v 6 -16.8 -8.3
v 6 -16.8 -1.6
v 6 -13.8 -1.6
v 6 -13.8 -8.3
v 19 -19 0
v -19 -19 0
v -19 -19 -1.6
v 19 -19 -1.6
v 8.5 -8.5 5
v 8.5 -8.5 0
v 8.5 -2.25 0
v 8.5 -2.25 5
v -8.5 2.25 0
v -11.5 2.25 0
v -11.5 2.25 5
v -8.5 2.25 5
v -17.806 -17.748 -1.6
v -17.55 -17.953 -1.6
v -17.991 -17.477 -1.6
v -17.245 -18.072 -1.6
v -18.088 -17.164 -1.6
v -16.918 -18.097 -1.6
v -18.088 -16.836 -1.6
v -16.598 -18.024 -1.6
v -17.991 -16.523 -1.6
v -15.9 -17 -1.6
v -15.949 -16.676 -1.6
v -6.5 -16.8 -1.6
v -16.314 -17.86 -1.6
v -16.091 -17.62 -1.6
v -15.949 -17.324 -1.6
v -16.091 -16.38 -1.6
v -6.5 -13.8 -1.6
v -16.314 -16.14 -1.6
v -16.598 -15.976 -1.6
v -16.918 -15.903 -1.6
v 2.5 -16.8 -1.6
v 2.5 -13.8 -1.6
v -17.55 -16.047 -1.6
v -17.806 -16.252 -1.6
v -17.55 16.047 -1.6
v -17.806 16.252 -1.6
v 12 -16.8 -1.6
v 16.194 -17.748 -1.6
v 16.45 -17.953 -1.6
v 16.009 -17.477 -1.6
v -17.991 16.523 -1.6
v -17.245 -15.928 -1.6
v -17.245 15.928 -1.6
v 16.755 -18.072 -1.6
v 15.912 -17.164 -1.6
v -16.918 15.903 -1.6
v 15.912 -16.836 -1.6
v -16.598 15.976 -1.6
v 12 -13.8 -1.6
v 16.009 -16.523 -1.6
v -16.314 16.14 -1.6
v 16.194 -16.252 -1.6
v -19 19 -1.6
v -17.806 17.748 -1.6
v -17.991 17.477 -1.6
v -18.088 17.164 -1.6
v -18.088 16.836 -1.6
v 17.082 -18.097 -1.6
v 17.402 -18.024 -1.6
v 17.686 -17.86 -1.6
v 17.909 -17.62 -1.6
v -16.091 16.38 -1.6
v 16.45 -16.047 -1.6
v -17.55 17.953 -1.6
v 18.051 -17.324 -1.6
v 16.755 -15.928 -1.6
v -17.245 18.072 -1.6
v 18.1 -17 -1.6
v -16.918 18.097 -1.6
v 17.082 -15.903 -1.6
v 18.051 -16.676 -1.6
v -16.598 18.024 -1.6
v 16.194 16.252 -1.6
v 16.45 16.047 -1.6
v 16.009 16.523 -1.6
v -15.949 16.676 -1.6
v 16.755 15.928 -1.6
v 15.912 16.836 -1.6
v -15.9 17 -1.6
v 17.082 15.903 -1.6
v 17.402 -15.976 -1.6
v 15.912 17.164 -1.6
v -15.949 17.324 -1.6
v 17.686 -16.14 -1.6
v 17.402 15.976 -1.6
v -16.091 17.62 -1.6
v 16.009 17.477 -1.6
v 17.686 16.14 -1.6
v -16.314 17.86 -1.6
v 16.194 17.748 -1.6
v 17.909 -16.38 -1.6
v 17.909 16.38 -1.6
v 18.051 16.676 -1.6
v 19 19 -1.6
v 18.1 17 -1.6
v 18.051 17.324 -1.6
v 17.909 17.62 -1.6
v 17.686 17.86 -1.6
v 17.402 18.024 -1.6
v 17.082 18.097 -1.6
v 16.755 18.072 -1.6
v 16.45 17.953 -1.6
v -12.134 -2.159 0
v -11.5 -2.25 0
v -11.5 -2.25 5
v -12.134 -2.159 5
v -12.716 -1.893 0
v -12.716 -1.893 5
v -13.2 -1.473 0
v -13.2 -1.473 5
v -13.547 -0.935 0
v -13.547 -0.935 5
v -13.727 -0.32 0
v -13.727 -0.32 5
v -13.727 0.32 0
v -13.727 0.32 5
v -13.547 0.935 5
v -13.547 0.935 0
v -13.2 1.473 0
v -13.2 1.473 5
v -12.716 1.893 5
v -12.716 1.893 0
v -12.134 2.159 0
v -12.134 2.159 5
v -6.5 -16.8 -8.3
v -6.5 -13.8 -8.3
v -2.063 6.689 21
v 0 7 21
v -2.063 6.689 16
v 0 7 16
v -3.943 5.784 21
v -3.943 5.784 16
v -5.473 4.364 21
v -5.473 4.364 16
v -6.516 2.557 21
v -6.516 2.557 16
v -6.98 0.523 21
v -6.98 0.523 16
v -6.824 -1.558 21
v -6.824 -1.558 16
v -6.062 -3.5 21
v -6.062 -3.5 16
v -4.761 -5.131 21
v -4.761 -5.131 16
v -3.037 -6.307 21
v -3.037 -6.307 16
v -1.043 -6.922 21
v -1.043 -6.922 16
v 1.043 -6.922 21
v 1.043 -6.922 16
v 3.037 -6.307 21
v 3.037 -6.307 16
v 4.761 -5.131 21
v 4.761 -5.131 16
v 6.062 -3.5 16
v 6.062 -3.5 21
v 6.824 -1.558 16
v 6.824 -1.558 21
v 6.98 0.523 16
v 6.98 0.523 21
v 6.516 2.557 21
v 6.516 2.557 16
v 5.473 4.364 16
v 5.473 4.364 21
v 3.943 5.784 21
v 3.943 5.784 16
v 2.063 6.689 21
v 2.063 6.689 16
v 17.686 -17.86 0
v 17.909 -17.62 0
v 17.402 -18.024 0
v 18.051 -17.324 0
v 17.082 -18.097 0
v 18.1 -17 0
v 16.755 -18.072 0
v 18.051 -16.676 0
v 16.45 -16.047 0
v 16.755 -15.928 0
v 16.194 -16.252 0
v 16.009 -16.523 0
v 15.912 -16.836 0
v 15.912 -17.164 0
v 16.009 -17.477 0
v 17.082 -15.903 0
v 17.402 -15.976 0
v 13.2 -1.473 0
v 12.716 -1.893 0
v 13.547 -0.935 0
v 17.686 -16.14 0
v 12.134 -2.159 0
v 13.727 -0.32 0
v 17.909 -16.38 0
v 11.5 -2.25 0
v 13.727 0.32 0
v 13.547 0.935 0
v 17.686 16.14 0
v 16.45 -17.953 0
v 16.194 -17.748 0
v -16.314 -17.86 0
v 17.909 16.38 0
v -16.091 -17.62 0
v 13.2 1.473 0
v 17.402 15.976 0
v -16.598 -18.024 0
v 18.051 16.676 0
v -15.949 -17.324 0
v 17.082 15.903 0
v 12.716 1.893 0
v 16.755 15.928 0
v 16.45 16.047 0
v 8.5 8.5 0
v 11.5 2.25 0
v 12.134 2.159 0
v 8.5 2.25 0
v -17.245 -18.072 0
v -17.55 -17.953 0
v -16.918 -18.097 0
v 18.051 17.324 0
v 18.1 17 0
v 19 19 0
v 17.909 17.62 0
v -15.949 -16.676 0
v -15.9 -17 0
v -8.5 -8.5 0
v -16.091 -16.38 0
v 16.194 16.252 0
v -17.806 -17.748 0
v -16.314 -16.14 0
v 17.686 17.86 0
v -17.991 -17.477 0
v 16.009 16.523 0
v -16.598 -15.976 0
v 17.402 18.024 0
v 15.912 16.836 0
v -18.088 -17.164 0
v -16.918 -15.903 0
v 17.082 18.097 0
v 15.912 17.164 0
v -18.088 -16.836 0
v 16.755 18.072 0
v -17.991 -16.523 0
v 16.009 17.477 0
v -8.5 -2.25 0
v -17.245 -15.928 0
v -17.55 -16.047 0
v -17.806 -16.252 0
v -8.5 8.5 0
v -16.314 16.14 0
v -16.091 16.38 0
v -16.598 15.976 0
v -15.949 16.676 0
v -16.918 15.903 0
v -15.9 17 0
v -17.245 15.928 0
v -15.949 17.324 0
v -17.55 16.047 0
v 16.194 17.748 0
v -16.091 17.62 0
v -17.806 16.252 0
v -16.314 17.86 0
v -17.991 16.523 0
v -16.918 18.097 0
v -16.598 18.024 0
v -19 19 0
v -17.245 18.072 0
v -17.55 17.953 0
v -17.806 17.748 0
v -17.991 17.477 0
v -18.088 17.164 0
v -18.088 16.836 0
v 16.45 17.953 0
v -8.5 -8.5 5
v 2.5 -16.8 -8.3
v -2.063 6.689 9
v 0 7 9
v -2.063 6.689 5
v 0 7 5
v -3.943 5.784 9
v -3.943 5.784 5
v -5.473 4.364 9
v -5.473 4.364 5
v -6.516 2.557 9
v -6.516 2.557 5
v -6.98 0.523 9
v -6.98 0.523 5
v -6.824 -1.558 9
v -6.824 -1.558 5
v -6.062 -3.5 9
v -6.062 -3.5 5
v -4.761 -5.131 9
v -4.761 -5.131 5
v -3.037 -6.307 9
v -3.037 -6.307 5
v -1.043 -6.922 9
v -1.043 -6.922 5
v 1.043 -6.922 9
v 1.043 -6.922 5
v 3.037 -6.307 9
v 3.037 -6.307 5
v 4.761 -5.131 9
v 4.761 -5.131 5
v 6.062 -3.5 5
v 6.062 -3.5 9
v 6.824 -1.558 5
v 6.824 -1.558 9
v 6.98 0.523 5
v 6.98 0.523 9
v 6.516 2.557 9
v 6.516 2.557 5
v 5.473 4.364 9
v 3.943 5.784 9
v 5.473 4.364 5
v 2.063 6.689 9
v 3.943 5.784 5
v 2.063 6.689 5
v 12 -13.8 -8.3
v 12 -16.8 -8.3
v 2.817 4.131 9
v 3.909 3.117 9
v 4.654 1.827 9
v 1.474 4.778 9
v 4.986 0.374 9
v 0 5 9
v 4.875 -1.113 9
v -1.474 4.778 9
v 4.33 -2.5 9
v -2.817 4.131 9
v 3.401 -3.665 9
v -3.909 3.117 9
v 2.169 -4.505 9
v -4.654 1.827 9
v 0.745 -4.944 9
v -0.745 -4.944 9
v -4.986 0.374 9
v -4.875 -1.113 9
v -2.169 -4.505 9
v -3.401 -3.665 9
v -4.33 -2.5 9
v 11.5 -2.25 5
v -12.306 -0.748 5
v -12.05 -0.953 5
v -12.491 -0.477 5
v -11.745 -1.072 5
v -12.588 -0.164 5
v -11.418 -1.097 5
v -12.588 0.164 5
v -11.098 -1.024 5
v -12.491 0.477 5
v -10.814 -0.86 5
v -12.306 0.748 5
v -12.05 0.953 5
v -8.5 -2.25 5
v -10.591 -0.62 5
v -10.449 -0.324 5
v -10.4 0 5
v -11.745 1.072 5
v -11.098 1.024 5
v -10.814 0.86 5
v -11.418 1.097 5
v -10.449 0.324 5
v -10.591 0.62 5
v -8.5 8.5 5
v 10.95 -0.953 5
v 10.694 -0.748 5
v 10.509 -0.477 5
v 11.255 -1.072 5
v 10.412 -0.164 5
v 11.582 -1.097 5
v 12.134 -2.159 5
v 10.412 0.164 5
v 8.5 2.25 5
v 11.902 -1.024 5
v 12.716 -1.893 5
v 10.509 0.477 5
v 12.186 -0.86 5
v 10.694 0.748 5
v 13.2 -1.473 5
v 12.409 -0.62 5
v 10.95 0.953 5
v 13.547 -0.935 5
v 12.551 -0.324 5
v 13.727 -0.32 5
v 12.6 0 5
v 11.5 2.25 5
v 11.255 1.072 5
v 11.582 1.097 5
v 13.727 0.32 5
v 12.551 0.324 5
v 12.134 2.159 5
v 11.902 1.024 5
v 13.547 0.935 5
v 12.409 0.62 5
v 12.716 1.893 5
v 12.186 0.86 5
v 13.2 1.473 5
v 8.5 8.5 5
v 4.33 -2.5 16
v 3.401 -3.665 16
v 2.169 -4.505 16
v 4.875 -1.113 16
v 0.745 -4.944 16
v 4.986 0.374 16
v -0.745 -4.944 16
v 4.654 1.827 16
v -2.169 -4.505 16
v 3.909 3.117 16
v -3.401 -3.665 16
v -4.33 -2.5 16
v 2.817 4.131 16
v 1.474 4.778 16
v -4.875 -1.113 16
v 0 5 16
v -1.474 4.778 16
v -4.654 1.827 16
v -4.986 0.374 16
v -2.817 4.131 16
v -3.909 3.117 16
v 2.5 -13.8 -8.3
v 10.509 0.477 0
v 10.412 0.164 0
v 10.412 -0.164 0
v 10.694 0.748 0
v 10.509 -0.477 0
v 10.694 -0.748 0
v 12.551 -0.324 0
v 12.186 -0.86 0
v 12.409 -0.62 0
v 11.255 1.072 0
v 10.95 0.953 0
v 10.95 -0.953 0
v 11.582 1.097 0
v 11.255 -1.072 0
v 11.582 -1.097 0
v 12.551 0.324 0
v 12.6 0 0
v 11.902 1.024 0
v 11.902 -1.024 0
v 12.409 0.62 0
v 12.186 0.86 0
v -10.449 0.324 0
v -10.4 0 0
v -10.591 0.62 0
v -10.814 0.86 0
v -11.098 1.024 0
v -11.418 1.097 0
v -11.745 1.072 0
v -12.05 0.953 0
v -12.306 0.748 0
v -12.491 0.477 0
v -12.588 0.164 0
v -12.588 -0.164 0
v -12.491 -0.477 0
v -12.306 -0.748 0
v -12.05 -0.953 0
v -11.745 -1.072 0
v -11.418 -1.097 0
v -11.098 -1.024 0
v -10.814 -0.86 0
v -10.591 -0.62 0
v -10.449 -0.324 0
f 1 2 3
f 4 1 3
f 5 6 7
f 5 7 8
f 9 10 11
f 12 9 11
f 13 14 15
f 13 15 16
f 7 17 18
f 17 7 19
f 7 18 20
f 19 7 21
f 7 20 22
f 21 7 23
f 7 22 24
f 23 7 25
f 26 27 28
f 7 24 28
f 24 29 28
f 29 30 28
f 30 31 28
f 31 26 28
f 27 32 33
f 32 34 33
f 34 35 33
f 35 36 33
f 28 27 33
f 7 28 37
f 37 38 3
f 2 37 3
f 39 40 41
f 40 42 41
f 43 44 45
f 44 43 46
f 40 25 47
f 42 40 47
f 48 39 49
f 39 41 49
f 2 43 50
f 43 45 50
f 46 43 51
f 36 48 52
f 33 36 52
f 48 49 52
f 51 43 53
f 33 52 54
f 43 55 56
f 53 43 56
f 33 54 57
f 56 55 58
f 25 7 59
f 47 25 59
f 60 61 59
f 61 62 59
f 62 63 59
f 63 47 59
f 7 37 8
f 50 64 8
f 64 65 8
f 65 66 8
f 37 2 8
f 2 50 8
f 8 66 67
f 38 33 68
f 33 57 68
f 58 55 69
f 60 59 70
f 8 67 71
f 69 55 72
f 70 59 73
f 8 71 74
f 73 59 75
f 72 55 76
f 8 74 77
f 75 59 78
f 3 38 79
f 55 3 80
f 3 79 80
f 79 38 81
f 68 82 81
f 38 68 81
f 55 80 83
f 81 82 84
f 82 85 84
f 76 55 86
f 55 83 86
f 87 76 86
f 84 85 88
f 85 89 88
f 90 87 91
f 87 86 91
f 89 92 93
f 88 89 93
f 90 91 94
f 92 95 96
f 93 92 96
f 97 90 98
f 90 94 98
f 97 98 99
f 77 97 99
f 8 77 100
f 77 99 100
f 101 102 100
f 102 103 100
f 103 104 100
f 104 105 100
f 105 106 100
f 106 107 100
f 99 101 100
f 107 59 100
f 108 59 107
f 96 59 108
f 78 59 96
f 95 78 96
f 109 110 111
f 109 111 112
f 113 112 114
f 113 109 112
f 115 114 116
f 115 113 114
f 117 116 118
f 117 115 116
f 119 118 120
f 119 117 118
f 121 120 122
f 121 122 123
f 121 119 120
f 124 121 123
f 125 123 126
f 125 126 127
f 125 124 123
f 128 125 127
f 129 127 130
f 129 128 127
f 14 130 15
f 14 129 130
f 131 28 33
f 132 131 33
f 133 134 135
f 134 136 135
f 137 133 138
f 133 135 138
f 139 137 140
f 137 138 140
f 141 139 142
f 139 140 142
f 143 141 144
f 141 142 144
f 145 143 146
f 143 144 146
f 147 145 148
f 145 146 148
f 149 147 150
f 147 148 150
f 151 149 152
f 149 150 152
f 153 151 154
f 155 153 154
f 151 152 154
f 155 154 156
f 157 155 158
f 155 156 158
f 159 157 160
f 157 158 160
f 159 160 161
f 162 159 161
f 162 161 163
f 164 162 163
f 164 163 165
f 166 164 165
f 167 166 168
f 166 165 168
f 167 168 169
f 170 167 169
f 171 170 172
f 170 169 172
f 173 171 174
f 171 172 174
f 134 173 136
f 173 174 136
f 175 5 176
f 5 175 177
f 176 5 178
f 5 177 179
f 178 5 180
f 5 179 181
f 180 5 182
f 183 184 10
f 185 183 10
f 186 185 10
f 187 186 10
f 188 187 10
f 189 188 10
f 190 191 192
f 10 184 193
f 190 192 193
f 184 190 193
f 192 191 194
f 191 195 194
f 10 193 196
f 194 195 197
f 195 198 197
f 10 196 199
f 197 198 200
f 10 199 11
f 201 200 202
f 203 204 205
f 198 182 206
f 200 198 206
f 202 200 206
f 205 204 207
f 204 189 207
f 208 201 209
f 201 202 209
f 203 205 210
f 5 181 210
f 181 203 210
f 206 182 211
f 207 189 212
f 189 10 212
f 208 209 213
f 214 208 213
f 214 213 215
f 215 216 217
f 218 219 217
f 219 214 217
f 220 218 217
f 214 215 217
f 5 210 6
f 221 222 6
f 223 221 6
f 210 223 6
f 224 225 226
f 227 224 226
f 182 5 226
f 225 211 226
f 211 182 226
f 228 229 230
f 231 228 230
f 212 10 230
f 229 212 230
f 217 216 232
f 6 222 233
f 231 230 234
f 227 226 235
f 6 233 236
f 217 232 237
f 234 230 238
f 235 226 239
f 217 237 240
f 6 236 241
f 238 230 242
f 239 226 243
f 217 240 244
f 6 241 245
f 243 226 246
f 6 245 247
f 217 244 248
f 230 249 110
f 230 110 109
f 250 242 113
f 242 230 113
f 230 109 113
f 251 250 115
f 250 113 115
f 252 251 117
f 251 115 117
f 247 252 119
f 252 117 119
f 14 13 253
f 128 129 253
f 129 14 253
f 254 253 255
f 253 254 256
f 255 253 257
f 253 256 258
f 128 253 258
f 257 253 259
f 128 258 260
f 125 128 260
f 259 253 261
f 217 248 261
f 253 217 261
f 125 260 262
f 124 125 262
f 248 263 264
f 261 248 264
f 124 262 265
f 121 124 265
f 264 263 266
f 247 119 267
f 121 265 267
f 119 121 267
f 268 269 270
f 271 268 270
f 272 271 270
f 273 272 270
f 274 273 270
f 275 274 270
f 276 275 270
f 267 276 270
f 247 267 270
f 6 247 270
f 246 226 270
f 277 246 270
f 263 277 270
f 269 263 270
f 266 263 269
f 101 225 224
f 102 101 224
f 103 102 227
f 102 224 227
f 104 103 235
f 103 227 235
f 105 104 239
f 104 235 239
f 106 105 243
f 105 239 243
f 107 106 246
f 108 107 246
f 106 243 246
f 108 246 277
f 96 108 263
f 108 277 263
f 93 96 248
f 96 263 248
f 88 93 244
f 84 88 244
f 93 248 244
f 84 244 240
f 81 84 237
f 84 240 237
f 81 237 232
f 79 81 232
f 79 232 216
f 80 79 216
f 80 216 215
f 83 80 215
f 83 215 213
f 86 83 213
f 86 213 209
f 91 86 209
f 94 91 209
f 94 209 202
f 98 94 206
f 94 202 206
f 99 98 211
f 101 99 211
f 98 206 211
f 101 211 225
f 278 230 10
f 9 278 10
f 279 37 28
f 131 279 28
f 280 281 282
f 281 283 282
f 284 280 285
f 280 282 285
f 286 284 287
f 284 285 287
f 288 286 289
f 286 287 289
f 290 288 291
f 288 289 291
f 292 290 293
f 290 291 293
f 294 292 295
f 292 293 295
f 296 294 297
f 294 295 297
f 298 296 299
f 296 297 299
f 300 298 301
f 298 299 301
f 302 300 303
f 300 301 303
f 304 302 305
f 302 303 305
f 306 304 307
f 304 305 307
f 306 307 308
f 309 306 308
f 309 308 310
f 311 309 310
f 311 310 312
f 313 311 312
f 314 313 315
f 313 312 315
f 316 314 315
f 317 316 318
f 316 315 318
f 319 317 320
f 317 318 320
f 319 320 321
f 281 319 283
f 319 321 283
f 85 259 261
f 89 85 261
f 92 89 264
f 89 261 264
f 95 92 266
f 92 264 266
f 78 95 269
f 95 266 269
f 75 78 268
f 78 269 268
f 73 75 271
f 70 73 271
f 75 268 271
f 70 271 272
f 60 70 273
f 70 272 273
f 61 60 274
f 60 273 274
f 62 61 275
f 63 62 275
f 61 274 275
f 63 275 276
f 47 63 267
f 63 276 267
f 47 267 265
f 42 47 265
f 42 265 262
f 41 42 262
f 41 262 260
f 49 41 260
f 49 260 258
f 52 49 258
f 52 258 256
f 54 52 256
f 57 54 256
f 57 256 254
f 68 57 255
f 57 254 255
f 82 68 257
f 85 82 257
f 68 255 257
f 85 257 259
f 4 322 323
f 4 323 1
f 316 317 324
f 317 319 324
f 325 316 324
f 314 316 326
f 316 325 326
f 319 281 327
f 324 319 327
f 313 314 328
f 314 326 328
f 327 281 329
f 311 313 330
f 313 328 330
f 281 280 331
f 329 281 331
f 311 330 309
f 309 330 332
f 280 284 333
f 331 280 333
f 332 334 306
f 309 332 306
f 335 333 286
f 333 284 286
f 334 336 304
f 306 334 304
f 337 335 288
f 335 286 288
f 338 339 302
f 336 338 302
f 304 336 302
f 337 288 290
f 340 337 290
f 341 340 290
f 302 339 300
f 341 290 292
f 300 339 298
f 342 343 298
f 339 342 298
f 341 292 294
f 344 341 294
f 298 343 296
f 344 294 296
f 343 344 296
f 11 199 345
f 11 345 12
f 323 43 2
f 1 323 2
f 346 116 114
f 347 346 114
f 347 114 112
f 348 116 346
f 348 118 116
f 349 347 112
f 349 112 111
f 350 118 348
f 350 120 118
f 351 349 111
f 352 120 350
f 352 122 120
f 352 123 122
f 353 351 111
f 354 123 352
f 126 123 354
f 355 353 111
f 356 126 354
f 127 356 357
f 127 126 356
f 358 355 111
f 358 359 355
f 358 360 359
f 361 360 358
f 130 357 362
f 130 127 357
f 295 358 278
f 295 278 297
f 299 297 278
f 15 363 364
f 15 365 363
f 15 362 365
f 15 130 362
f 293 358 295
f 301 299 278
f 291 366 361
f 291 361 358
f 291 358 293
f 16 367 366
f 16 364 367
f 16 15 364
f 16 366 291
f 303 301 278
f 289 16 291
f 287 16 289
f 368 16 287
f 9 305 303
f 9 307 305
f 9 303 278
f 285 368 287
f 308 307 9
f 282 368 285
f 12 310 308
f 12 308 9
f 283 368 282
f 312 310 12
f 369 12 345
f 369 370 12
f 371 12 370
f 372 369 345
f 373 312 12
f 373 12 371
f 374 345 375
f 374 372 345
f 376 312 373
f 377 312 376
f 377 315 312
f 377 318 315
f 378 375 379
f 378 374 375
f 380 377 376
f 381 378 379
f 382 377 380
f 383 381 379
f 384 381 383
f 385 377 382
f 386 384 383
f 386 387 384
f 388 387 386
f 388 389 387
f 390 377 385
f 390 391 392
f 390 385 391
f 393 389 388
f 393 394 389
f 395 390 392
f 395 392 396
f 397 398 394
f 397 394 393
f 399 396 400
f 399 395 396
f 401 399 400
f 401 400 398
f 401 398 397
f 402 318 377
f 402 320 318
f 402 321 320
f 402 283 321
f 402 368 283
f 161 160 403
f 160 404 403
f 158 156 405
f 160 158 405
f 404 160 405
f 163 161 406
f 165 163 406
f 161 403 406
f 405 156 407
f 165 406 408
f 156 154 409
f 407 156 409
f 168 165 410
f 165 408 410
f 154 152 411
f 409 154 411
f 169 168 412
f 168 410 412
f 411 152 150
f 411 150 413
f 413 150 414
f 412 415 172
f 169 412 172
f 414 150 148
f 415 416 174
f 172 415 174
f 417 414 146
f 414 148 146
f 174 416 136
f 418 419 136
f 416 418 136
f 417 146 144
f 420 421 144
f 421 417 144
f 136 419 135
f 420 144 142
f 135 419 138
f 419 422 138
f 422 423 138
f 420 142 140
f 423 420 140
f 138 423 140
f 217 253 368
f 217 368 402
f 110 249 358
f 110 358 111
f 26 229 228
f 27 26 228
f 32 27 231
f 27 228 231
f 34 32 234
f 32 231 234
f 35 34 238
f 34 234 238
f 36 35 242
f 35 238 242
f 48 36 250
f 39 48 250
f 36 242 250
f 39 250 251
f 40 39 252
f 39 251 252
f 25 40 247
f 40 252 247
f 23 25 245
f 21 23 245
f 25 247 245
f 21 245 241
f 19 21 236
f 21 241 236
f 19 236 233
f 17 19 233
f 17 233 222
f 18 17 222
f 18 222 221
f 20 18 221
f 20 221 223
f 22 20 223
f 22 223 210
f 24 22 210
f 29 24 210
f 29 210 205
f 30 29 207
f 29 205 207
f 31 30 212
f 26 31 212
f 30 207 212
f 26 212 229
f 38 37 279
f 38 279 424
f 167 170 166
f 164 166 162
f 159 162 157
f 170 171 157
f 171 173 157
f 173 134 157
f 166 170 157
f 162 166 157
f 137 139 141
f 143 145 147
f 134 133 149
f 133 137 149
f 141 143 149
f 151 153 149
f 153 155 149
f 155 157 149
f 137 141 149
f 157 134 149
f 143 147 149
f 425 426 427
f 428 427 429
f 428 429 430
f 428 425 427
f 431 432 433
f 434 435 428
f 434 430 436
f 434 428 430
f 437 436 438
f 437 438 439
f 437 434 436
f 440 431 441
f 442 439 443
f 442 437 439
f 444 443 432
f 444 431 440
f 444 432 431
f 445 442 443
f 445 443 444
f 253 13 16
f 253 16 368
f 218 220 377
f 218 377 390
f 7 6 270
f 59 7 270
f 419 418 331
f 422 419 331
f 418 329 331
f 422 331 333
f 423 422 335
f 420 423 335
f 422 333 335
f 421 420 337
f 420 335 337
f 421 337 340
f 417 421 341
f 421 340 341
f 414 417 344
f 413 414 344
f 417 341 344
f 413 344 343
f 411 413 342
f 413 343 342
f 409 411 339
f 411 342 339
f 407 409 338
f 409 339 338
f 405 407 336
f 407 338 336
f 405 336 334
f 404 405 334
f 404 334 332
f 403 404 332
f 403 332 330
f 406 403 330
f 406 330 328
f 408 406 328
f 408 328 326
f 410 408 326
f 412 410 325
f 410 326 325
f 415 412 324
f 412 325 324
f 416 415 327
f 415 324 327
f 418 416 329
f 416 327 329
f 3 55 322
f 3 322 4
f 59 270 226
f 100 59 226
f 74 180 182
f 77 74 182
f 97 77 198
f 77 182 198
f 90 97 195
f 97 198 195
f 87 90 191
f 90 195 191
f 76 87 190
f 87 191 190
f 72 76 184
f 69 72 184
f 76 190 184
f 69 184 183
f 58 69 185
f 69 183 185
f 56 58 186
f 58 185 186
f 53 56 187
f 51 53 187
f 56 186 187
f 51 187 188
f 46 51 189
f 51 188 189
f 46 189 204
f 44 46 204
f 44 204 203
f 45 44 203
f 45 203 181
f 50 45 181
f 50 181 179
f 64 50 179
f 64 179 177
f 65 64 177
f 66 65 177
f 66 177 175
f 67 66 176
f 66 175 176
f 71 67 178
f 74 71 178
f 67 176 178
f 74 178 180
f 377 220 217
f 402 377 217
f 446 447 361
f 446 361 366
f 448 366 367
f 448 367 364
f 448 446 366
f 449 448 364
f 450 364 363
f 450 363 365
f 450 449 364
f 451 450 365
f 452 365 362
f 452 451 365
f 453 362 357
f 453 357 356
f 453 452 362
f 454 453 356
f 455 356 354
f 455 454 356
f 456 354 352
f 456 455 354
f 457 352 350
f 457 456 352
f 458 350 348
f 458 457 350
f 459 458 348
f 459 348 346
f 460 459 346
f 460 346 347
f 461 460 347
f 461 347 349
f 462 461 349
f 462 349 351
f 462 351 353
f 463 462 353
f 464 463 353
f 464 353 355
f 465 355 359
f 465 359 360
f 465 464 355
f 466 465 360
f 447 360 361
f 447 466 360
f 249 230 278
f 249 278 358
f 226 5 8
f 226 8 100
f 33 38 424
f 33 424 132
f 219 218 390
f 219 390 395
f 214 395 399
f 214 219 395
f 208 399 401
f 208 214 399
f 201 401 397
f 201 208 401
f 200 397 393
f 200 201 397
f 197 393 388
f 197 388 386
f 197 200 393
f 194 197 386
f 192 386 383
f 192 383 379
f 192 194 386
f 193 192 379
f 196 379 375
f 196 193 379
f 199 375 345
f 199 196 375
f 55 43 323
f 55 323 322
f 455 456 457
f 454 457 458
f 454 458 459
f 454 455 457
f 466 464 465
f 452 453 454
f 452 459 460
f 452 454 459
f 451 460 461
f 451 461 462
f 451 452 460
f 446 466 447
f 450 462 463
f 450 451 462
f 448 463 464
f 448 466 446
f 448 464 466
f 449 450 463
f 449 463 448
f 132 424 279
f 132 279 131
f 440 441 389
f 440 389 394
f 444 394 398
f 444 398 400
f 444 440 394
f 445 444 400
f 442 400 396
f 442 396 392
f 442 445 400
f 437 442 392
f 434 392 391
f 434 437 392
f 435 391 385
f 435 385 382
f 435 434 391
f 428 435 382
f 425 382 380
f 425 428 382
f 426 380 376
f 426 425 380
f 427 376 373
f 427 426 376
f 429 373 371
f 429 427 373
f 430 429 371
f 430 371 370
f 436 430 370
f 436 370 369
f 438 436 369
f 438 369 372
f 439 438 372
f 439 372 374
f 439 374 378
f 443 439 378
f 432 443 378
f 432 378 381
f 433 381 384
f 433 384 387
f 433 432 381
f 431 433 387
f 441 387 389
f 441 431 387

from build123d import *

# Parameters (mm, degrees)
SKETCH_1_W      = 38
SKETCH_1_H      = 38
SKETCH_1_R      = 1.1
EXTRUDE_2_DEPTH = 1.6
SKETCH_1_4_W    = 17
SKETCH_1_4_H    = 17
SKETCH_1_4_R    = 1.1
EXTRUDE_3_DEPTH = 5
EXTRUDE_START   = -1.6
SKETCH_4_W      = 6
SKETCH_4_H      = 3
SKETCH_4_W_2    = 9
EXTRUDE_4_DEPTH = 8.3


with BuildPart() as part:
    # 草图1 → 凸台-拉伸2 (new body)
    with BuildSketch(Plane.XY):
        Rectangle(SKETCH_1_W, SKETCH_1_H)
        with Locations((-17, 17)):
            Circle(SKETCH_1_R, mode=Mode.SUBTRACT)
        with Locations((17, 17)):
            Circle(SKETCH_1_R, mode=Mode.SUBTRACT)
        with Locations((17, -17)):
            Circle(SKETCH_1_R, mode=Mode.SUBTRACT)
        with Locations((-17, -17)):
            Circle(SKETCH_1_R, mode=Mode.SUBTRACT)
    extrude(amount=-EXTRUDE_2_DEPTH)

    # 草图1<4> → 凸台-拉伸3 (add)
    # profile 1 of 2: a face of its own
    with BuildSketch(Plane.XY):
        Rectangle(SKETCH_1_4_W, SKETCH_1_4_H)
    # profile 2 of 2: a face of its own
    with BuildSketch(Plane.XY):
        with BuildLine():
            Line((-11.5, 2.25), (11.5, 2.25))
            ThreePointArc((11.5, 2.25), (13.75, 0), (11.5, -2.25))
            Line((11.5, -2.25), (-11.5, -2.25))
            ThreePointArc((-11.5, -2.25), (-13.75, 0), (-11.5, 2.25))
        make_face()
        with Locations((11.5, 0)):
            Circle(SKETCH_1_4_R, mode=Mode.SUBTRACT)
        with Locations((-11.5, 0)):
            Circle(SKETCH_1_4_R, mode=Mode.SUBTRACT)
    extrude(amount=EXTRUDE_3_DEPTH)

    # 草图3 → 旋转3 (revolve)
    with BuildSketch(Plane(origin=(0, 0, 0), x_dir=(0, 0, -1), z_dir=(1, 0, 0))):
        Polygon((-5, 0), (-9, 0), (-16, 0), (-21, 0), (-21, 7), (-16, 7), (-16, 5), (-9, 5), (-9, 7), (-5, 7), align=None)
    revolve(axis=Axis((0, 0, 5), (0, 0, 1)))

    # 草图4 → 凸台-拉伸4 (add)
    with BuildSketch(Plane(origin=(0, 0, -1.6), x_dir=(-1, 0, 0), z_dir=(0, 0, -1)).offset(EXTRUDE_START)):
        with Locations((-9, -15.3)):
            Rectangle(SKETCH_4_W, SKETCH_4_H)
        with Locations((2, -15.3)):
            Rectangle(SKETCH_4_W_2, SKETCH_4_H)
    extrude(amount=EXTRUDE_4_DEPTH)


solid = part.part
